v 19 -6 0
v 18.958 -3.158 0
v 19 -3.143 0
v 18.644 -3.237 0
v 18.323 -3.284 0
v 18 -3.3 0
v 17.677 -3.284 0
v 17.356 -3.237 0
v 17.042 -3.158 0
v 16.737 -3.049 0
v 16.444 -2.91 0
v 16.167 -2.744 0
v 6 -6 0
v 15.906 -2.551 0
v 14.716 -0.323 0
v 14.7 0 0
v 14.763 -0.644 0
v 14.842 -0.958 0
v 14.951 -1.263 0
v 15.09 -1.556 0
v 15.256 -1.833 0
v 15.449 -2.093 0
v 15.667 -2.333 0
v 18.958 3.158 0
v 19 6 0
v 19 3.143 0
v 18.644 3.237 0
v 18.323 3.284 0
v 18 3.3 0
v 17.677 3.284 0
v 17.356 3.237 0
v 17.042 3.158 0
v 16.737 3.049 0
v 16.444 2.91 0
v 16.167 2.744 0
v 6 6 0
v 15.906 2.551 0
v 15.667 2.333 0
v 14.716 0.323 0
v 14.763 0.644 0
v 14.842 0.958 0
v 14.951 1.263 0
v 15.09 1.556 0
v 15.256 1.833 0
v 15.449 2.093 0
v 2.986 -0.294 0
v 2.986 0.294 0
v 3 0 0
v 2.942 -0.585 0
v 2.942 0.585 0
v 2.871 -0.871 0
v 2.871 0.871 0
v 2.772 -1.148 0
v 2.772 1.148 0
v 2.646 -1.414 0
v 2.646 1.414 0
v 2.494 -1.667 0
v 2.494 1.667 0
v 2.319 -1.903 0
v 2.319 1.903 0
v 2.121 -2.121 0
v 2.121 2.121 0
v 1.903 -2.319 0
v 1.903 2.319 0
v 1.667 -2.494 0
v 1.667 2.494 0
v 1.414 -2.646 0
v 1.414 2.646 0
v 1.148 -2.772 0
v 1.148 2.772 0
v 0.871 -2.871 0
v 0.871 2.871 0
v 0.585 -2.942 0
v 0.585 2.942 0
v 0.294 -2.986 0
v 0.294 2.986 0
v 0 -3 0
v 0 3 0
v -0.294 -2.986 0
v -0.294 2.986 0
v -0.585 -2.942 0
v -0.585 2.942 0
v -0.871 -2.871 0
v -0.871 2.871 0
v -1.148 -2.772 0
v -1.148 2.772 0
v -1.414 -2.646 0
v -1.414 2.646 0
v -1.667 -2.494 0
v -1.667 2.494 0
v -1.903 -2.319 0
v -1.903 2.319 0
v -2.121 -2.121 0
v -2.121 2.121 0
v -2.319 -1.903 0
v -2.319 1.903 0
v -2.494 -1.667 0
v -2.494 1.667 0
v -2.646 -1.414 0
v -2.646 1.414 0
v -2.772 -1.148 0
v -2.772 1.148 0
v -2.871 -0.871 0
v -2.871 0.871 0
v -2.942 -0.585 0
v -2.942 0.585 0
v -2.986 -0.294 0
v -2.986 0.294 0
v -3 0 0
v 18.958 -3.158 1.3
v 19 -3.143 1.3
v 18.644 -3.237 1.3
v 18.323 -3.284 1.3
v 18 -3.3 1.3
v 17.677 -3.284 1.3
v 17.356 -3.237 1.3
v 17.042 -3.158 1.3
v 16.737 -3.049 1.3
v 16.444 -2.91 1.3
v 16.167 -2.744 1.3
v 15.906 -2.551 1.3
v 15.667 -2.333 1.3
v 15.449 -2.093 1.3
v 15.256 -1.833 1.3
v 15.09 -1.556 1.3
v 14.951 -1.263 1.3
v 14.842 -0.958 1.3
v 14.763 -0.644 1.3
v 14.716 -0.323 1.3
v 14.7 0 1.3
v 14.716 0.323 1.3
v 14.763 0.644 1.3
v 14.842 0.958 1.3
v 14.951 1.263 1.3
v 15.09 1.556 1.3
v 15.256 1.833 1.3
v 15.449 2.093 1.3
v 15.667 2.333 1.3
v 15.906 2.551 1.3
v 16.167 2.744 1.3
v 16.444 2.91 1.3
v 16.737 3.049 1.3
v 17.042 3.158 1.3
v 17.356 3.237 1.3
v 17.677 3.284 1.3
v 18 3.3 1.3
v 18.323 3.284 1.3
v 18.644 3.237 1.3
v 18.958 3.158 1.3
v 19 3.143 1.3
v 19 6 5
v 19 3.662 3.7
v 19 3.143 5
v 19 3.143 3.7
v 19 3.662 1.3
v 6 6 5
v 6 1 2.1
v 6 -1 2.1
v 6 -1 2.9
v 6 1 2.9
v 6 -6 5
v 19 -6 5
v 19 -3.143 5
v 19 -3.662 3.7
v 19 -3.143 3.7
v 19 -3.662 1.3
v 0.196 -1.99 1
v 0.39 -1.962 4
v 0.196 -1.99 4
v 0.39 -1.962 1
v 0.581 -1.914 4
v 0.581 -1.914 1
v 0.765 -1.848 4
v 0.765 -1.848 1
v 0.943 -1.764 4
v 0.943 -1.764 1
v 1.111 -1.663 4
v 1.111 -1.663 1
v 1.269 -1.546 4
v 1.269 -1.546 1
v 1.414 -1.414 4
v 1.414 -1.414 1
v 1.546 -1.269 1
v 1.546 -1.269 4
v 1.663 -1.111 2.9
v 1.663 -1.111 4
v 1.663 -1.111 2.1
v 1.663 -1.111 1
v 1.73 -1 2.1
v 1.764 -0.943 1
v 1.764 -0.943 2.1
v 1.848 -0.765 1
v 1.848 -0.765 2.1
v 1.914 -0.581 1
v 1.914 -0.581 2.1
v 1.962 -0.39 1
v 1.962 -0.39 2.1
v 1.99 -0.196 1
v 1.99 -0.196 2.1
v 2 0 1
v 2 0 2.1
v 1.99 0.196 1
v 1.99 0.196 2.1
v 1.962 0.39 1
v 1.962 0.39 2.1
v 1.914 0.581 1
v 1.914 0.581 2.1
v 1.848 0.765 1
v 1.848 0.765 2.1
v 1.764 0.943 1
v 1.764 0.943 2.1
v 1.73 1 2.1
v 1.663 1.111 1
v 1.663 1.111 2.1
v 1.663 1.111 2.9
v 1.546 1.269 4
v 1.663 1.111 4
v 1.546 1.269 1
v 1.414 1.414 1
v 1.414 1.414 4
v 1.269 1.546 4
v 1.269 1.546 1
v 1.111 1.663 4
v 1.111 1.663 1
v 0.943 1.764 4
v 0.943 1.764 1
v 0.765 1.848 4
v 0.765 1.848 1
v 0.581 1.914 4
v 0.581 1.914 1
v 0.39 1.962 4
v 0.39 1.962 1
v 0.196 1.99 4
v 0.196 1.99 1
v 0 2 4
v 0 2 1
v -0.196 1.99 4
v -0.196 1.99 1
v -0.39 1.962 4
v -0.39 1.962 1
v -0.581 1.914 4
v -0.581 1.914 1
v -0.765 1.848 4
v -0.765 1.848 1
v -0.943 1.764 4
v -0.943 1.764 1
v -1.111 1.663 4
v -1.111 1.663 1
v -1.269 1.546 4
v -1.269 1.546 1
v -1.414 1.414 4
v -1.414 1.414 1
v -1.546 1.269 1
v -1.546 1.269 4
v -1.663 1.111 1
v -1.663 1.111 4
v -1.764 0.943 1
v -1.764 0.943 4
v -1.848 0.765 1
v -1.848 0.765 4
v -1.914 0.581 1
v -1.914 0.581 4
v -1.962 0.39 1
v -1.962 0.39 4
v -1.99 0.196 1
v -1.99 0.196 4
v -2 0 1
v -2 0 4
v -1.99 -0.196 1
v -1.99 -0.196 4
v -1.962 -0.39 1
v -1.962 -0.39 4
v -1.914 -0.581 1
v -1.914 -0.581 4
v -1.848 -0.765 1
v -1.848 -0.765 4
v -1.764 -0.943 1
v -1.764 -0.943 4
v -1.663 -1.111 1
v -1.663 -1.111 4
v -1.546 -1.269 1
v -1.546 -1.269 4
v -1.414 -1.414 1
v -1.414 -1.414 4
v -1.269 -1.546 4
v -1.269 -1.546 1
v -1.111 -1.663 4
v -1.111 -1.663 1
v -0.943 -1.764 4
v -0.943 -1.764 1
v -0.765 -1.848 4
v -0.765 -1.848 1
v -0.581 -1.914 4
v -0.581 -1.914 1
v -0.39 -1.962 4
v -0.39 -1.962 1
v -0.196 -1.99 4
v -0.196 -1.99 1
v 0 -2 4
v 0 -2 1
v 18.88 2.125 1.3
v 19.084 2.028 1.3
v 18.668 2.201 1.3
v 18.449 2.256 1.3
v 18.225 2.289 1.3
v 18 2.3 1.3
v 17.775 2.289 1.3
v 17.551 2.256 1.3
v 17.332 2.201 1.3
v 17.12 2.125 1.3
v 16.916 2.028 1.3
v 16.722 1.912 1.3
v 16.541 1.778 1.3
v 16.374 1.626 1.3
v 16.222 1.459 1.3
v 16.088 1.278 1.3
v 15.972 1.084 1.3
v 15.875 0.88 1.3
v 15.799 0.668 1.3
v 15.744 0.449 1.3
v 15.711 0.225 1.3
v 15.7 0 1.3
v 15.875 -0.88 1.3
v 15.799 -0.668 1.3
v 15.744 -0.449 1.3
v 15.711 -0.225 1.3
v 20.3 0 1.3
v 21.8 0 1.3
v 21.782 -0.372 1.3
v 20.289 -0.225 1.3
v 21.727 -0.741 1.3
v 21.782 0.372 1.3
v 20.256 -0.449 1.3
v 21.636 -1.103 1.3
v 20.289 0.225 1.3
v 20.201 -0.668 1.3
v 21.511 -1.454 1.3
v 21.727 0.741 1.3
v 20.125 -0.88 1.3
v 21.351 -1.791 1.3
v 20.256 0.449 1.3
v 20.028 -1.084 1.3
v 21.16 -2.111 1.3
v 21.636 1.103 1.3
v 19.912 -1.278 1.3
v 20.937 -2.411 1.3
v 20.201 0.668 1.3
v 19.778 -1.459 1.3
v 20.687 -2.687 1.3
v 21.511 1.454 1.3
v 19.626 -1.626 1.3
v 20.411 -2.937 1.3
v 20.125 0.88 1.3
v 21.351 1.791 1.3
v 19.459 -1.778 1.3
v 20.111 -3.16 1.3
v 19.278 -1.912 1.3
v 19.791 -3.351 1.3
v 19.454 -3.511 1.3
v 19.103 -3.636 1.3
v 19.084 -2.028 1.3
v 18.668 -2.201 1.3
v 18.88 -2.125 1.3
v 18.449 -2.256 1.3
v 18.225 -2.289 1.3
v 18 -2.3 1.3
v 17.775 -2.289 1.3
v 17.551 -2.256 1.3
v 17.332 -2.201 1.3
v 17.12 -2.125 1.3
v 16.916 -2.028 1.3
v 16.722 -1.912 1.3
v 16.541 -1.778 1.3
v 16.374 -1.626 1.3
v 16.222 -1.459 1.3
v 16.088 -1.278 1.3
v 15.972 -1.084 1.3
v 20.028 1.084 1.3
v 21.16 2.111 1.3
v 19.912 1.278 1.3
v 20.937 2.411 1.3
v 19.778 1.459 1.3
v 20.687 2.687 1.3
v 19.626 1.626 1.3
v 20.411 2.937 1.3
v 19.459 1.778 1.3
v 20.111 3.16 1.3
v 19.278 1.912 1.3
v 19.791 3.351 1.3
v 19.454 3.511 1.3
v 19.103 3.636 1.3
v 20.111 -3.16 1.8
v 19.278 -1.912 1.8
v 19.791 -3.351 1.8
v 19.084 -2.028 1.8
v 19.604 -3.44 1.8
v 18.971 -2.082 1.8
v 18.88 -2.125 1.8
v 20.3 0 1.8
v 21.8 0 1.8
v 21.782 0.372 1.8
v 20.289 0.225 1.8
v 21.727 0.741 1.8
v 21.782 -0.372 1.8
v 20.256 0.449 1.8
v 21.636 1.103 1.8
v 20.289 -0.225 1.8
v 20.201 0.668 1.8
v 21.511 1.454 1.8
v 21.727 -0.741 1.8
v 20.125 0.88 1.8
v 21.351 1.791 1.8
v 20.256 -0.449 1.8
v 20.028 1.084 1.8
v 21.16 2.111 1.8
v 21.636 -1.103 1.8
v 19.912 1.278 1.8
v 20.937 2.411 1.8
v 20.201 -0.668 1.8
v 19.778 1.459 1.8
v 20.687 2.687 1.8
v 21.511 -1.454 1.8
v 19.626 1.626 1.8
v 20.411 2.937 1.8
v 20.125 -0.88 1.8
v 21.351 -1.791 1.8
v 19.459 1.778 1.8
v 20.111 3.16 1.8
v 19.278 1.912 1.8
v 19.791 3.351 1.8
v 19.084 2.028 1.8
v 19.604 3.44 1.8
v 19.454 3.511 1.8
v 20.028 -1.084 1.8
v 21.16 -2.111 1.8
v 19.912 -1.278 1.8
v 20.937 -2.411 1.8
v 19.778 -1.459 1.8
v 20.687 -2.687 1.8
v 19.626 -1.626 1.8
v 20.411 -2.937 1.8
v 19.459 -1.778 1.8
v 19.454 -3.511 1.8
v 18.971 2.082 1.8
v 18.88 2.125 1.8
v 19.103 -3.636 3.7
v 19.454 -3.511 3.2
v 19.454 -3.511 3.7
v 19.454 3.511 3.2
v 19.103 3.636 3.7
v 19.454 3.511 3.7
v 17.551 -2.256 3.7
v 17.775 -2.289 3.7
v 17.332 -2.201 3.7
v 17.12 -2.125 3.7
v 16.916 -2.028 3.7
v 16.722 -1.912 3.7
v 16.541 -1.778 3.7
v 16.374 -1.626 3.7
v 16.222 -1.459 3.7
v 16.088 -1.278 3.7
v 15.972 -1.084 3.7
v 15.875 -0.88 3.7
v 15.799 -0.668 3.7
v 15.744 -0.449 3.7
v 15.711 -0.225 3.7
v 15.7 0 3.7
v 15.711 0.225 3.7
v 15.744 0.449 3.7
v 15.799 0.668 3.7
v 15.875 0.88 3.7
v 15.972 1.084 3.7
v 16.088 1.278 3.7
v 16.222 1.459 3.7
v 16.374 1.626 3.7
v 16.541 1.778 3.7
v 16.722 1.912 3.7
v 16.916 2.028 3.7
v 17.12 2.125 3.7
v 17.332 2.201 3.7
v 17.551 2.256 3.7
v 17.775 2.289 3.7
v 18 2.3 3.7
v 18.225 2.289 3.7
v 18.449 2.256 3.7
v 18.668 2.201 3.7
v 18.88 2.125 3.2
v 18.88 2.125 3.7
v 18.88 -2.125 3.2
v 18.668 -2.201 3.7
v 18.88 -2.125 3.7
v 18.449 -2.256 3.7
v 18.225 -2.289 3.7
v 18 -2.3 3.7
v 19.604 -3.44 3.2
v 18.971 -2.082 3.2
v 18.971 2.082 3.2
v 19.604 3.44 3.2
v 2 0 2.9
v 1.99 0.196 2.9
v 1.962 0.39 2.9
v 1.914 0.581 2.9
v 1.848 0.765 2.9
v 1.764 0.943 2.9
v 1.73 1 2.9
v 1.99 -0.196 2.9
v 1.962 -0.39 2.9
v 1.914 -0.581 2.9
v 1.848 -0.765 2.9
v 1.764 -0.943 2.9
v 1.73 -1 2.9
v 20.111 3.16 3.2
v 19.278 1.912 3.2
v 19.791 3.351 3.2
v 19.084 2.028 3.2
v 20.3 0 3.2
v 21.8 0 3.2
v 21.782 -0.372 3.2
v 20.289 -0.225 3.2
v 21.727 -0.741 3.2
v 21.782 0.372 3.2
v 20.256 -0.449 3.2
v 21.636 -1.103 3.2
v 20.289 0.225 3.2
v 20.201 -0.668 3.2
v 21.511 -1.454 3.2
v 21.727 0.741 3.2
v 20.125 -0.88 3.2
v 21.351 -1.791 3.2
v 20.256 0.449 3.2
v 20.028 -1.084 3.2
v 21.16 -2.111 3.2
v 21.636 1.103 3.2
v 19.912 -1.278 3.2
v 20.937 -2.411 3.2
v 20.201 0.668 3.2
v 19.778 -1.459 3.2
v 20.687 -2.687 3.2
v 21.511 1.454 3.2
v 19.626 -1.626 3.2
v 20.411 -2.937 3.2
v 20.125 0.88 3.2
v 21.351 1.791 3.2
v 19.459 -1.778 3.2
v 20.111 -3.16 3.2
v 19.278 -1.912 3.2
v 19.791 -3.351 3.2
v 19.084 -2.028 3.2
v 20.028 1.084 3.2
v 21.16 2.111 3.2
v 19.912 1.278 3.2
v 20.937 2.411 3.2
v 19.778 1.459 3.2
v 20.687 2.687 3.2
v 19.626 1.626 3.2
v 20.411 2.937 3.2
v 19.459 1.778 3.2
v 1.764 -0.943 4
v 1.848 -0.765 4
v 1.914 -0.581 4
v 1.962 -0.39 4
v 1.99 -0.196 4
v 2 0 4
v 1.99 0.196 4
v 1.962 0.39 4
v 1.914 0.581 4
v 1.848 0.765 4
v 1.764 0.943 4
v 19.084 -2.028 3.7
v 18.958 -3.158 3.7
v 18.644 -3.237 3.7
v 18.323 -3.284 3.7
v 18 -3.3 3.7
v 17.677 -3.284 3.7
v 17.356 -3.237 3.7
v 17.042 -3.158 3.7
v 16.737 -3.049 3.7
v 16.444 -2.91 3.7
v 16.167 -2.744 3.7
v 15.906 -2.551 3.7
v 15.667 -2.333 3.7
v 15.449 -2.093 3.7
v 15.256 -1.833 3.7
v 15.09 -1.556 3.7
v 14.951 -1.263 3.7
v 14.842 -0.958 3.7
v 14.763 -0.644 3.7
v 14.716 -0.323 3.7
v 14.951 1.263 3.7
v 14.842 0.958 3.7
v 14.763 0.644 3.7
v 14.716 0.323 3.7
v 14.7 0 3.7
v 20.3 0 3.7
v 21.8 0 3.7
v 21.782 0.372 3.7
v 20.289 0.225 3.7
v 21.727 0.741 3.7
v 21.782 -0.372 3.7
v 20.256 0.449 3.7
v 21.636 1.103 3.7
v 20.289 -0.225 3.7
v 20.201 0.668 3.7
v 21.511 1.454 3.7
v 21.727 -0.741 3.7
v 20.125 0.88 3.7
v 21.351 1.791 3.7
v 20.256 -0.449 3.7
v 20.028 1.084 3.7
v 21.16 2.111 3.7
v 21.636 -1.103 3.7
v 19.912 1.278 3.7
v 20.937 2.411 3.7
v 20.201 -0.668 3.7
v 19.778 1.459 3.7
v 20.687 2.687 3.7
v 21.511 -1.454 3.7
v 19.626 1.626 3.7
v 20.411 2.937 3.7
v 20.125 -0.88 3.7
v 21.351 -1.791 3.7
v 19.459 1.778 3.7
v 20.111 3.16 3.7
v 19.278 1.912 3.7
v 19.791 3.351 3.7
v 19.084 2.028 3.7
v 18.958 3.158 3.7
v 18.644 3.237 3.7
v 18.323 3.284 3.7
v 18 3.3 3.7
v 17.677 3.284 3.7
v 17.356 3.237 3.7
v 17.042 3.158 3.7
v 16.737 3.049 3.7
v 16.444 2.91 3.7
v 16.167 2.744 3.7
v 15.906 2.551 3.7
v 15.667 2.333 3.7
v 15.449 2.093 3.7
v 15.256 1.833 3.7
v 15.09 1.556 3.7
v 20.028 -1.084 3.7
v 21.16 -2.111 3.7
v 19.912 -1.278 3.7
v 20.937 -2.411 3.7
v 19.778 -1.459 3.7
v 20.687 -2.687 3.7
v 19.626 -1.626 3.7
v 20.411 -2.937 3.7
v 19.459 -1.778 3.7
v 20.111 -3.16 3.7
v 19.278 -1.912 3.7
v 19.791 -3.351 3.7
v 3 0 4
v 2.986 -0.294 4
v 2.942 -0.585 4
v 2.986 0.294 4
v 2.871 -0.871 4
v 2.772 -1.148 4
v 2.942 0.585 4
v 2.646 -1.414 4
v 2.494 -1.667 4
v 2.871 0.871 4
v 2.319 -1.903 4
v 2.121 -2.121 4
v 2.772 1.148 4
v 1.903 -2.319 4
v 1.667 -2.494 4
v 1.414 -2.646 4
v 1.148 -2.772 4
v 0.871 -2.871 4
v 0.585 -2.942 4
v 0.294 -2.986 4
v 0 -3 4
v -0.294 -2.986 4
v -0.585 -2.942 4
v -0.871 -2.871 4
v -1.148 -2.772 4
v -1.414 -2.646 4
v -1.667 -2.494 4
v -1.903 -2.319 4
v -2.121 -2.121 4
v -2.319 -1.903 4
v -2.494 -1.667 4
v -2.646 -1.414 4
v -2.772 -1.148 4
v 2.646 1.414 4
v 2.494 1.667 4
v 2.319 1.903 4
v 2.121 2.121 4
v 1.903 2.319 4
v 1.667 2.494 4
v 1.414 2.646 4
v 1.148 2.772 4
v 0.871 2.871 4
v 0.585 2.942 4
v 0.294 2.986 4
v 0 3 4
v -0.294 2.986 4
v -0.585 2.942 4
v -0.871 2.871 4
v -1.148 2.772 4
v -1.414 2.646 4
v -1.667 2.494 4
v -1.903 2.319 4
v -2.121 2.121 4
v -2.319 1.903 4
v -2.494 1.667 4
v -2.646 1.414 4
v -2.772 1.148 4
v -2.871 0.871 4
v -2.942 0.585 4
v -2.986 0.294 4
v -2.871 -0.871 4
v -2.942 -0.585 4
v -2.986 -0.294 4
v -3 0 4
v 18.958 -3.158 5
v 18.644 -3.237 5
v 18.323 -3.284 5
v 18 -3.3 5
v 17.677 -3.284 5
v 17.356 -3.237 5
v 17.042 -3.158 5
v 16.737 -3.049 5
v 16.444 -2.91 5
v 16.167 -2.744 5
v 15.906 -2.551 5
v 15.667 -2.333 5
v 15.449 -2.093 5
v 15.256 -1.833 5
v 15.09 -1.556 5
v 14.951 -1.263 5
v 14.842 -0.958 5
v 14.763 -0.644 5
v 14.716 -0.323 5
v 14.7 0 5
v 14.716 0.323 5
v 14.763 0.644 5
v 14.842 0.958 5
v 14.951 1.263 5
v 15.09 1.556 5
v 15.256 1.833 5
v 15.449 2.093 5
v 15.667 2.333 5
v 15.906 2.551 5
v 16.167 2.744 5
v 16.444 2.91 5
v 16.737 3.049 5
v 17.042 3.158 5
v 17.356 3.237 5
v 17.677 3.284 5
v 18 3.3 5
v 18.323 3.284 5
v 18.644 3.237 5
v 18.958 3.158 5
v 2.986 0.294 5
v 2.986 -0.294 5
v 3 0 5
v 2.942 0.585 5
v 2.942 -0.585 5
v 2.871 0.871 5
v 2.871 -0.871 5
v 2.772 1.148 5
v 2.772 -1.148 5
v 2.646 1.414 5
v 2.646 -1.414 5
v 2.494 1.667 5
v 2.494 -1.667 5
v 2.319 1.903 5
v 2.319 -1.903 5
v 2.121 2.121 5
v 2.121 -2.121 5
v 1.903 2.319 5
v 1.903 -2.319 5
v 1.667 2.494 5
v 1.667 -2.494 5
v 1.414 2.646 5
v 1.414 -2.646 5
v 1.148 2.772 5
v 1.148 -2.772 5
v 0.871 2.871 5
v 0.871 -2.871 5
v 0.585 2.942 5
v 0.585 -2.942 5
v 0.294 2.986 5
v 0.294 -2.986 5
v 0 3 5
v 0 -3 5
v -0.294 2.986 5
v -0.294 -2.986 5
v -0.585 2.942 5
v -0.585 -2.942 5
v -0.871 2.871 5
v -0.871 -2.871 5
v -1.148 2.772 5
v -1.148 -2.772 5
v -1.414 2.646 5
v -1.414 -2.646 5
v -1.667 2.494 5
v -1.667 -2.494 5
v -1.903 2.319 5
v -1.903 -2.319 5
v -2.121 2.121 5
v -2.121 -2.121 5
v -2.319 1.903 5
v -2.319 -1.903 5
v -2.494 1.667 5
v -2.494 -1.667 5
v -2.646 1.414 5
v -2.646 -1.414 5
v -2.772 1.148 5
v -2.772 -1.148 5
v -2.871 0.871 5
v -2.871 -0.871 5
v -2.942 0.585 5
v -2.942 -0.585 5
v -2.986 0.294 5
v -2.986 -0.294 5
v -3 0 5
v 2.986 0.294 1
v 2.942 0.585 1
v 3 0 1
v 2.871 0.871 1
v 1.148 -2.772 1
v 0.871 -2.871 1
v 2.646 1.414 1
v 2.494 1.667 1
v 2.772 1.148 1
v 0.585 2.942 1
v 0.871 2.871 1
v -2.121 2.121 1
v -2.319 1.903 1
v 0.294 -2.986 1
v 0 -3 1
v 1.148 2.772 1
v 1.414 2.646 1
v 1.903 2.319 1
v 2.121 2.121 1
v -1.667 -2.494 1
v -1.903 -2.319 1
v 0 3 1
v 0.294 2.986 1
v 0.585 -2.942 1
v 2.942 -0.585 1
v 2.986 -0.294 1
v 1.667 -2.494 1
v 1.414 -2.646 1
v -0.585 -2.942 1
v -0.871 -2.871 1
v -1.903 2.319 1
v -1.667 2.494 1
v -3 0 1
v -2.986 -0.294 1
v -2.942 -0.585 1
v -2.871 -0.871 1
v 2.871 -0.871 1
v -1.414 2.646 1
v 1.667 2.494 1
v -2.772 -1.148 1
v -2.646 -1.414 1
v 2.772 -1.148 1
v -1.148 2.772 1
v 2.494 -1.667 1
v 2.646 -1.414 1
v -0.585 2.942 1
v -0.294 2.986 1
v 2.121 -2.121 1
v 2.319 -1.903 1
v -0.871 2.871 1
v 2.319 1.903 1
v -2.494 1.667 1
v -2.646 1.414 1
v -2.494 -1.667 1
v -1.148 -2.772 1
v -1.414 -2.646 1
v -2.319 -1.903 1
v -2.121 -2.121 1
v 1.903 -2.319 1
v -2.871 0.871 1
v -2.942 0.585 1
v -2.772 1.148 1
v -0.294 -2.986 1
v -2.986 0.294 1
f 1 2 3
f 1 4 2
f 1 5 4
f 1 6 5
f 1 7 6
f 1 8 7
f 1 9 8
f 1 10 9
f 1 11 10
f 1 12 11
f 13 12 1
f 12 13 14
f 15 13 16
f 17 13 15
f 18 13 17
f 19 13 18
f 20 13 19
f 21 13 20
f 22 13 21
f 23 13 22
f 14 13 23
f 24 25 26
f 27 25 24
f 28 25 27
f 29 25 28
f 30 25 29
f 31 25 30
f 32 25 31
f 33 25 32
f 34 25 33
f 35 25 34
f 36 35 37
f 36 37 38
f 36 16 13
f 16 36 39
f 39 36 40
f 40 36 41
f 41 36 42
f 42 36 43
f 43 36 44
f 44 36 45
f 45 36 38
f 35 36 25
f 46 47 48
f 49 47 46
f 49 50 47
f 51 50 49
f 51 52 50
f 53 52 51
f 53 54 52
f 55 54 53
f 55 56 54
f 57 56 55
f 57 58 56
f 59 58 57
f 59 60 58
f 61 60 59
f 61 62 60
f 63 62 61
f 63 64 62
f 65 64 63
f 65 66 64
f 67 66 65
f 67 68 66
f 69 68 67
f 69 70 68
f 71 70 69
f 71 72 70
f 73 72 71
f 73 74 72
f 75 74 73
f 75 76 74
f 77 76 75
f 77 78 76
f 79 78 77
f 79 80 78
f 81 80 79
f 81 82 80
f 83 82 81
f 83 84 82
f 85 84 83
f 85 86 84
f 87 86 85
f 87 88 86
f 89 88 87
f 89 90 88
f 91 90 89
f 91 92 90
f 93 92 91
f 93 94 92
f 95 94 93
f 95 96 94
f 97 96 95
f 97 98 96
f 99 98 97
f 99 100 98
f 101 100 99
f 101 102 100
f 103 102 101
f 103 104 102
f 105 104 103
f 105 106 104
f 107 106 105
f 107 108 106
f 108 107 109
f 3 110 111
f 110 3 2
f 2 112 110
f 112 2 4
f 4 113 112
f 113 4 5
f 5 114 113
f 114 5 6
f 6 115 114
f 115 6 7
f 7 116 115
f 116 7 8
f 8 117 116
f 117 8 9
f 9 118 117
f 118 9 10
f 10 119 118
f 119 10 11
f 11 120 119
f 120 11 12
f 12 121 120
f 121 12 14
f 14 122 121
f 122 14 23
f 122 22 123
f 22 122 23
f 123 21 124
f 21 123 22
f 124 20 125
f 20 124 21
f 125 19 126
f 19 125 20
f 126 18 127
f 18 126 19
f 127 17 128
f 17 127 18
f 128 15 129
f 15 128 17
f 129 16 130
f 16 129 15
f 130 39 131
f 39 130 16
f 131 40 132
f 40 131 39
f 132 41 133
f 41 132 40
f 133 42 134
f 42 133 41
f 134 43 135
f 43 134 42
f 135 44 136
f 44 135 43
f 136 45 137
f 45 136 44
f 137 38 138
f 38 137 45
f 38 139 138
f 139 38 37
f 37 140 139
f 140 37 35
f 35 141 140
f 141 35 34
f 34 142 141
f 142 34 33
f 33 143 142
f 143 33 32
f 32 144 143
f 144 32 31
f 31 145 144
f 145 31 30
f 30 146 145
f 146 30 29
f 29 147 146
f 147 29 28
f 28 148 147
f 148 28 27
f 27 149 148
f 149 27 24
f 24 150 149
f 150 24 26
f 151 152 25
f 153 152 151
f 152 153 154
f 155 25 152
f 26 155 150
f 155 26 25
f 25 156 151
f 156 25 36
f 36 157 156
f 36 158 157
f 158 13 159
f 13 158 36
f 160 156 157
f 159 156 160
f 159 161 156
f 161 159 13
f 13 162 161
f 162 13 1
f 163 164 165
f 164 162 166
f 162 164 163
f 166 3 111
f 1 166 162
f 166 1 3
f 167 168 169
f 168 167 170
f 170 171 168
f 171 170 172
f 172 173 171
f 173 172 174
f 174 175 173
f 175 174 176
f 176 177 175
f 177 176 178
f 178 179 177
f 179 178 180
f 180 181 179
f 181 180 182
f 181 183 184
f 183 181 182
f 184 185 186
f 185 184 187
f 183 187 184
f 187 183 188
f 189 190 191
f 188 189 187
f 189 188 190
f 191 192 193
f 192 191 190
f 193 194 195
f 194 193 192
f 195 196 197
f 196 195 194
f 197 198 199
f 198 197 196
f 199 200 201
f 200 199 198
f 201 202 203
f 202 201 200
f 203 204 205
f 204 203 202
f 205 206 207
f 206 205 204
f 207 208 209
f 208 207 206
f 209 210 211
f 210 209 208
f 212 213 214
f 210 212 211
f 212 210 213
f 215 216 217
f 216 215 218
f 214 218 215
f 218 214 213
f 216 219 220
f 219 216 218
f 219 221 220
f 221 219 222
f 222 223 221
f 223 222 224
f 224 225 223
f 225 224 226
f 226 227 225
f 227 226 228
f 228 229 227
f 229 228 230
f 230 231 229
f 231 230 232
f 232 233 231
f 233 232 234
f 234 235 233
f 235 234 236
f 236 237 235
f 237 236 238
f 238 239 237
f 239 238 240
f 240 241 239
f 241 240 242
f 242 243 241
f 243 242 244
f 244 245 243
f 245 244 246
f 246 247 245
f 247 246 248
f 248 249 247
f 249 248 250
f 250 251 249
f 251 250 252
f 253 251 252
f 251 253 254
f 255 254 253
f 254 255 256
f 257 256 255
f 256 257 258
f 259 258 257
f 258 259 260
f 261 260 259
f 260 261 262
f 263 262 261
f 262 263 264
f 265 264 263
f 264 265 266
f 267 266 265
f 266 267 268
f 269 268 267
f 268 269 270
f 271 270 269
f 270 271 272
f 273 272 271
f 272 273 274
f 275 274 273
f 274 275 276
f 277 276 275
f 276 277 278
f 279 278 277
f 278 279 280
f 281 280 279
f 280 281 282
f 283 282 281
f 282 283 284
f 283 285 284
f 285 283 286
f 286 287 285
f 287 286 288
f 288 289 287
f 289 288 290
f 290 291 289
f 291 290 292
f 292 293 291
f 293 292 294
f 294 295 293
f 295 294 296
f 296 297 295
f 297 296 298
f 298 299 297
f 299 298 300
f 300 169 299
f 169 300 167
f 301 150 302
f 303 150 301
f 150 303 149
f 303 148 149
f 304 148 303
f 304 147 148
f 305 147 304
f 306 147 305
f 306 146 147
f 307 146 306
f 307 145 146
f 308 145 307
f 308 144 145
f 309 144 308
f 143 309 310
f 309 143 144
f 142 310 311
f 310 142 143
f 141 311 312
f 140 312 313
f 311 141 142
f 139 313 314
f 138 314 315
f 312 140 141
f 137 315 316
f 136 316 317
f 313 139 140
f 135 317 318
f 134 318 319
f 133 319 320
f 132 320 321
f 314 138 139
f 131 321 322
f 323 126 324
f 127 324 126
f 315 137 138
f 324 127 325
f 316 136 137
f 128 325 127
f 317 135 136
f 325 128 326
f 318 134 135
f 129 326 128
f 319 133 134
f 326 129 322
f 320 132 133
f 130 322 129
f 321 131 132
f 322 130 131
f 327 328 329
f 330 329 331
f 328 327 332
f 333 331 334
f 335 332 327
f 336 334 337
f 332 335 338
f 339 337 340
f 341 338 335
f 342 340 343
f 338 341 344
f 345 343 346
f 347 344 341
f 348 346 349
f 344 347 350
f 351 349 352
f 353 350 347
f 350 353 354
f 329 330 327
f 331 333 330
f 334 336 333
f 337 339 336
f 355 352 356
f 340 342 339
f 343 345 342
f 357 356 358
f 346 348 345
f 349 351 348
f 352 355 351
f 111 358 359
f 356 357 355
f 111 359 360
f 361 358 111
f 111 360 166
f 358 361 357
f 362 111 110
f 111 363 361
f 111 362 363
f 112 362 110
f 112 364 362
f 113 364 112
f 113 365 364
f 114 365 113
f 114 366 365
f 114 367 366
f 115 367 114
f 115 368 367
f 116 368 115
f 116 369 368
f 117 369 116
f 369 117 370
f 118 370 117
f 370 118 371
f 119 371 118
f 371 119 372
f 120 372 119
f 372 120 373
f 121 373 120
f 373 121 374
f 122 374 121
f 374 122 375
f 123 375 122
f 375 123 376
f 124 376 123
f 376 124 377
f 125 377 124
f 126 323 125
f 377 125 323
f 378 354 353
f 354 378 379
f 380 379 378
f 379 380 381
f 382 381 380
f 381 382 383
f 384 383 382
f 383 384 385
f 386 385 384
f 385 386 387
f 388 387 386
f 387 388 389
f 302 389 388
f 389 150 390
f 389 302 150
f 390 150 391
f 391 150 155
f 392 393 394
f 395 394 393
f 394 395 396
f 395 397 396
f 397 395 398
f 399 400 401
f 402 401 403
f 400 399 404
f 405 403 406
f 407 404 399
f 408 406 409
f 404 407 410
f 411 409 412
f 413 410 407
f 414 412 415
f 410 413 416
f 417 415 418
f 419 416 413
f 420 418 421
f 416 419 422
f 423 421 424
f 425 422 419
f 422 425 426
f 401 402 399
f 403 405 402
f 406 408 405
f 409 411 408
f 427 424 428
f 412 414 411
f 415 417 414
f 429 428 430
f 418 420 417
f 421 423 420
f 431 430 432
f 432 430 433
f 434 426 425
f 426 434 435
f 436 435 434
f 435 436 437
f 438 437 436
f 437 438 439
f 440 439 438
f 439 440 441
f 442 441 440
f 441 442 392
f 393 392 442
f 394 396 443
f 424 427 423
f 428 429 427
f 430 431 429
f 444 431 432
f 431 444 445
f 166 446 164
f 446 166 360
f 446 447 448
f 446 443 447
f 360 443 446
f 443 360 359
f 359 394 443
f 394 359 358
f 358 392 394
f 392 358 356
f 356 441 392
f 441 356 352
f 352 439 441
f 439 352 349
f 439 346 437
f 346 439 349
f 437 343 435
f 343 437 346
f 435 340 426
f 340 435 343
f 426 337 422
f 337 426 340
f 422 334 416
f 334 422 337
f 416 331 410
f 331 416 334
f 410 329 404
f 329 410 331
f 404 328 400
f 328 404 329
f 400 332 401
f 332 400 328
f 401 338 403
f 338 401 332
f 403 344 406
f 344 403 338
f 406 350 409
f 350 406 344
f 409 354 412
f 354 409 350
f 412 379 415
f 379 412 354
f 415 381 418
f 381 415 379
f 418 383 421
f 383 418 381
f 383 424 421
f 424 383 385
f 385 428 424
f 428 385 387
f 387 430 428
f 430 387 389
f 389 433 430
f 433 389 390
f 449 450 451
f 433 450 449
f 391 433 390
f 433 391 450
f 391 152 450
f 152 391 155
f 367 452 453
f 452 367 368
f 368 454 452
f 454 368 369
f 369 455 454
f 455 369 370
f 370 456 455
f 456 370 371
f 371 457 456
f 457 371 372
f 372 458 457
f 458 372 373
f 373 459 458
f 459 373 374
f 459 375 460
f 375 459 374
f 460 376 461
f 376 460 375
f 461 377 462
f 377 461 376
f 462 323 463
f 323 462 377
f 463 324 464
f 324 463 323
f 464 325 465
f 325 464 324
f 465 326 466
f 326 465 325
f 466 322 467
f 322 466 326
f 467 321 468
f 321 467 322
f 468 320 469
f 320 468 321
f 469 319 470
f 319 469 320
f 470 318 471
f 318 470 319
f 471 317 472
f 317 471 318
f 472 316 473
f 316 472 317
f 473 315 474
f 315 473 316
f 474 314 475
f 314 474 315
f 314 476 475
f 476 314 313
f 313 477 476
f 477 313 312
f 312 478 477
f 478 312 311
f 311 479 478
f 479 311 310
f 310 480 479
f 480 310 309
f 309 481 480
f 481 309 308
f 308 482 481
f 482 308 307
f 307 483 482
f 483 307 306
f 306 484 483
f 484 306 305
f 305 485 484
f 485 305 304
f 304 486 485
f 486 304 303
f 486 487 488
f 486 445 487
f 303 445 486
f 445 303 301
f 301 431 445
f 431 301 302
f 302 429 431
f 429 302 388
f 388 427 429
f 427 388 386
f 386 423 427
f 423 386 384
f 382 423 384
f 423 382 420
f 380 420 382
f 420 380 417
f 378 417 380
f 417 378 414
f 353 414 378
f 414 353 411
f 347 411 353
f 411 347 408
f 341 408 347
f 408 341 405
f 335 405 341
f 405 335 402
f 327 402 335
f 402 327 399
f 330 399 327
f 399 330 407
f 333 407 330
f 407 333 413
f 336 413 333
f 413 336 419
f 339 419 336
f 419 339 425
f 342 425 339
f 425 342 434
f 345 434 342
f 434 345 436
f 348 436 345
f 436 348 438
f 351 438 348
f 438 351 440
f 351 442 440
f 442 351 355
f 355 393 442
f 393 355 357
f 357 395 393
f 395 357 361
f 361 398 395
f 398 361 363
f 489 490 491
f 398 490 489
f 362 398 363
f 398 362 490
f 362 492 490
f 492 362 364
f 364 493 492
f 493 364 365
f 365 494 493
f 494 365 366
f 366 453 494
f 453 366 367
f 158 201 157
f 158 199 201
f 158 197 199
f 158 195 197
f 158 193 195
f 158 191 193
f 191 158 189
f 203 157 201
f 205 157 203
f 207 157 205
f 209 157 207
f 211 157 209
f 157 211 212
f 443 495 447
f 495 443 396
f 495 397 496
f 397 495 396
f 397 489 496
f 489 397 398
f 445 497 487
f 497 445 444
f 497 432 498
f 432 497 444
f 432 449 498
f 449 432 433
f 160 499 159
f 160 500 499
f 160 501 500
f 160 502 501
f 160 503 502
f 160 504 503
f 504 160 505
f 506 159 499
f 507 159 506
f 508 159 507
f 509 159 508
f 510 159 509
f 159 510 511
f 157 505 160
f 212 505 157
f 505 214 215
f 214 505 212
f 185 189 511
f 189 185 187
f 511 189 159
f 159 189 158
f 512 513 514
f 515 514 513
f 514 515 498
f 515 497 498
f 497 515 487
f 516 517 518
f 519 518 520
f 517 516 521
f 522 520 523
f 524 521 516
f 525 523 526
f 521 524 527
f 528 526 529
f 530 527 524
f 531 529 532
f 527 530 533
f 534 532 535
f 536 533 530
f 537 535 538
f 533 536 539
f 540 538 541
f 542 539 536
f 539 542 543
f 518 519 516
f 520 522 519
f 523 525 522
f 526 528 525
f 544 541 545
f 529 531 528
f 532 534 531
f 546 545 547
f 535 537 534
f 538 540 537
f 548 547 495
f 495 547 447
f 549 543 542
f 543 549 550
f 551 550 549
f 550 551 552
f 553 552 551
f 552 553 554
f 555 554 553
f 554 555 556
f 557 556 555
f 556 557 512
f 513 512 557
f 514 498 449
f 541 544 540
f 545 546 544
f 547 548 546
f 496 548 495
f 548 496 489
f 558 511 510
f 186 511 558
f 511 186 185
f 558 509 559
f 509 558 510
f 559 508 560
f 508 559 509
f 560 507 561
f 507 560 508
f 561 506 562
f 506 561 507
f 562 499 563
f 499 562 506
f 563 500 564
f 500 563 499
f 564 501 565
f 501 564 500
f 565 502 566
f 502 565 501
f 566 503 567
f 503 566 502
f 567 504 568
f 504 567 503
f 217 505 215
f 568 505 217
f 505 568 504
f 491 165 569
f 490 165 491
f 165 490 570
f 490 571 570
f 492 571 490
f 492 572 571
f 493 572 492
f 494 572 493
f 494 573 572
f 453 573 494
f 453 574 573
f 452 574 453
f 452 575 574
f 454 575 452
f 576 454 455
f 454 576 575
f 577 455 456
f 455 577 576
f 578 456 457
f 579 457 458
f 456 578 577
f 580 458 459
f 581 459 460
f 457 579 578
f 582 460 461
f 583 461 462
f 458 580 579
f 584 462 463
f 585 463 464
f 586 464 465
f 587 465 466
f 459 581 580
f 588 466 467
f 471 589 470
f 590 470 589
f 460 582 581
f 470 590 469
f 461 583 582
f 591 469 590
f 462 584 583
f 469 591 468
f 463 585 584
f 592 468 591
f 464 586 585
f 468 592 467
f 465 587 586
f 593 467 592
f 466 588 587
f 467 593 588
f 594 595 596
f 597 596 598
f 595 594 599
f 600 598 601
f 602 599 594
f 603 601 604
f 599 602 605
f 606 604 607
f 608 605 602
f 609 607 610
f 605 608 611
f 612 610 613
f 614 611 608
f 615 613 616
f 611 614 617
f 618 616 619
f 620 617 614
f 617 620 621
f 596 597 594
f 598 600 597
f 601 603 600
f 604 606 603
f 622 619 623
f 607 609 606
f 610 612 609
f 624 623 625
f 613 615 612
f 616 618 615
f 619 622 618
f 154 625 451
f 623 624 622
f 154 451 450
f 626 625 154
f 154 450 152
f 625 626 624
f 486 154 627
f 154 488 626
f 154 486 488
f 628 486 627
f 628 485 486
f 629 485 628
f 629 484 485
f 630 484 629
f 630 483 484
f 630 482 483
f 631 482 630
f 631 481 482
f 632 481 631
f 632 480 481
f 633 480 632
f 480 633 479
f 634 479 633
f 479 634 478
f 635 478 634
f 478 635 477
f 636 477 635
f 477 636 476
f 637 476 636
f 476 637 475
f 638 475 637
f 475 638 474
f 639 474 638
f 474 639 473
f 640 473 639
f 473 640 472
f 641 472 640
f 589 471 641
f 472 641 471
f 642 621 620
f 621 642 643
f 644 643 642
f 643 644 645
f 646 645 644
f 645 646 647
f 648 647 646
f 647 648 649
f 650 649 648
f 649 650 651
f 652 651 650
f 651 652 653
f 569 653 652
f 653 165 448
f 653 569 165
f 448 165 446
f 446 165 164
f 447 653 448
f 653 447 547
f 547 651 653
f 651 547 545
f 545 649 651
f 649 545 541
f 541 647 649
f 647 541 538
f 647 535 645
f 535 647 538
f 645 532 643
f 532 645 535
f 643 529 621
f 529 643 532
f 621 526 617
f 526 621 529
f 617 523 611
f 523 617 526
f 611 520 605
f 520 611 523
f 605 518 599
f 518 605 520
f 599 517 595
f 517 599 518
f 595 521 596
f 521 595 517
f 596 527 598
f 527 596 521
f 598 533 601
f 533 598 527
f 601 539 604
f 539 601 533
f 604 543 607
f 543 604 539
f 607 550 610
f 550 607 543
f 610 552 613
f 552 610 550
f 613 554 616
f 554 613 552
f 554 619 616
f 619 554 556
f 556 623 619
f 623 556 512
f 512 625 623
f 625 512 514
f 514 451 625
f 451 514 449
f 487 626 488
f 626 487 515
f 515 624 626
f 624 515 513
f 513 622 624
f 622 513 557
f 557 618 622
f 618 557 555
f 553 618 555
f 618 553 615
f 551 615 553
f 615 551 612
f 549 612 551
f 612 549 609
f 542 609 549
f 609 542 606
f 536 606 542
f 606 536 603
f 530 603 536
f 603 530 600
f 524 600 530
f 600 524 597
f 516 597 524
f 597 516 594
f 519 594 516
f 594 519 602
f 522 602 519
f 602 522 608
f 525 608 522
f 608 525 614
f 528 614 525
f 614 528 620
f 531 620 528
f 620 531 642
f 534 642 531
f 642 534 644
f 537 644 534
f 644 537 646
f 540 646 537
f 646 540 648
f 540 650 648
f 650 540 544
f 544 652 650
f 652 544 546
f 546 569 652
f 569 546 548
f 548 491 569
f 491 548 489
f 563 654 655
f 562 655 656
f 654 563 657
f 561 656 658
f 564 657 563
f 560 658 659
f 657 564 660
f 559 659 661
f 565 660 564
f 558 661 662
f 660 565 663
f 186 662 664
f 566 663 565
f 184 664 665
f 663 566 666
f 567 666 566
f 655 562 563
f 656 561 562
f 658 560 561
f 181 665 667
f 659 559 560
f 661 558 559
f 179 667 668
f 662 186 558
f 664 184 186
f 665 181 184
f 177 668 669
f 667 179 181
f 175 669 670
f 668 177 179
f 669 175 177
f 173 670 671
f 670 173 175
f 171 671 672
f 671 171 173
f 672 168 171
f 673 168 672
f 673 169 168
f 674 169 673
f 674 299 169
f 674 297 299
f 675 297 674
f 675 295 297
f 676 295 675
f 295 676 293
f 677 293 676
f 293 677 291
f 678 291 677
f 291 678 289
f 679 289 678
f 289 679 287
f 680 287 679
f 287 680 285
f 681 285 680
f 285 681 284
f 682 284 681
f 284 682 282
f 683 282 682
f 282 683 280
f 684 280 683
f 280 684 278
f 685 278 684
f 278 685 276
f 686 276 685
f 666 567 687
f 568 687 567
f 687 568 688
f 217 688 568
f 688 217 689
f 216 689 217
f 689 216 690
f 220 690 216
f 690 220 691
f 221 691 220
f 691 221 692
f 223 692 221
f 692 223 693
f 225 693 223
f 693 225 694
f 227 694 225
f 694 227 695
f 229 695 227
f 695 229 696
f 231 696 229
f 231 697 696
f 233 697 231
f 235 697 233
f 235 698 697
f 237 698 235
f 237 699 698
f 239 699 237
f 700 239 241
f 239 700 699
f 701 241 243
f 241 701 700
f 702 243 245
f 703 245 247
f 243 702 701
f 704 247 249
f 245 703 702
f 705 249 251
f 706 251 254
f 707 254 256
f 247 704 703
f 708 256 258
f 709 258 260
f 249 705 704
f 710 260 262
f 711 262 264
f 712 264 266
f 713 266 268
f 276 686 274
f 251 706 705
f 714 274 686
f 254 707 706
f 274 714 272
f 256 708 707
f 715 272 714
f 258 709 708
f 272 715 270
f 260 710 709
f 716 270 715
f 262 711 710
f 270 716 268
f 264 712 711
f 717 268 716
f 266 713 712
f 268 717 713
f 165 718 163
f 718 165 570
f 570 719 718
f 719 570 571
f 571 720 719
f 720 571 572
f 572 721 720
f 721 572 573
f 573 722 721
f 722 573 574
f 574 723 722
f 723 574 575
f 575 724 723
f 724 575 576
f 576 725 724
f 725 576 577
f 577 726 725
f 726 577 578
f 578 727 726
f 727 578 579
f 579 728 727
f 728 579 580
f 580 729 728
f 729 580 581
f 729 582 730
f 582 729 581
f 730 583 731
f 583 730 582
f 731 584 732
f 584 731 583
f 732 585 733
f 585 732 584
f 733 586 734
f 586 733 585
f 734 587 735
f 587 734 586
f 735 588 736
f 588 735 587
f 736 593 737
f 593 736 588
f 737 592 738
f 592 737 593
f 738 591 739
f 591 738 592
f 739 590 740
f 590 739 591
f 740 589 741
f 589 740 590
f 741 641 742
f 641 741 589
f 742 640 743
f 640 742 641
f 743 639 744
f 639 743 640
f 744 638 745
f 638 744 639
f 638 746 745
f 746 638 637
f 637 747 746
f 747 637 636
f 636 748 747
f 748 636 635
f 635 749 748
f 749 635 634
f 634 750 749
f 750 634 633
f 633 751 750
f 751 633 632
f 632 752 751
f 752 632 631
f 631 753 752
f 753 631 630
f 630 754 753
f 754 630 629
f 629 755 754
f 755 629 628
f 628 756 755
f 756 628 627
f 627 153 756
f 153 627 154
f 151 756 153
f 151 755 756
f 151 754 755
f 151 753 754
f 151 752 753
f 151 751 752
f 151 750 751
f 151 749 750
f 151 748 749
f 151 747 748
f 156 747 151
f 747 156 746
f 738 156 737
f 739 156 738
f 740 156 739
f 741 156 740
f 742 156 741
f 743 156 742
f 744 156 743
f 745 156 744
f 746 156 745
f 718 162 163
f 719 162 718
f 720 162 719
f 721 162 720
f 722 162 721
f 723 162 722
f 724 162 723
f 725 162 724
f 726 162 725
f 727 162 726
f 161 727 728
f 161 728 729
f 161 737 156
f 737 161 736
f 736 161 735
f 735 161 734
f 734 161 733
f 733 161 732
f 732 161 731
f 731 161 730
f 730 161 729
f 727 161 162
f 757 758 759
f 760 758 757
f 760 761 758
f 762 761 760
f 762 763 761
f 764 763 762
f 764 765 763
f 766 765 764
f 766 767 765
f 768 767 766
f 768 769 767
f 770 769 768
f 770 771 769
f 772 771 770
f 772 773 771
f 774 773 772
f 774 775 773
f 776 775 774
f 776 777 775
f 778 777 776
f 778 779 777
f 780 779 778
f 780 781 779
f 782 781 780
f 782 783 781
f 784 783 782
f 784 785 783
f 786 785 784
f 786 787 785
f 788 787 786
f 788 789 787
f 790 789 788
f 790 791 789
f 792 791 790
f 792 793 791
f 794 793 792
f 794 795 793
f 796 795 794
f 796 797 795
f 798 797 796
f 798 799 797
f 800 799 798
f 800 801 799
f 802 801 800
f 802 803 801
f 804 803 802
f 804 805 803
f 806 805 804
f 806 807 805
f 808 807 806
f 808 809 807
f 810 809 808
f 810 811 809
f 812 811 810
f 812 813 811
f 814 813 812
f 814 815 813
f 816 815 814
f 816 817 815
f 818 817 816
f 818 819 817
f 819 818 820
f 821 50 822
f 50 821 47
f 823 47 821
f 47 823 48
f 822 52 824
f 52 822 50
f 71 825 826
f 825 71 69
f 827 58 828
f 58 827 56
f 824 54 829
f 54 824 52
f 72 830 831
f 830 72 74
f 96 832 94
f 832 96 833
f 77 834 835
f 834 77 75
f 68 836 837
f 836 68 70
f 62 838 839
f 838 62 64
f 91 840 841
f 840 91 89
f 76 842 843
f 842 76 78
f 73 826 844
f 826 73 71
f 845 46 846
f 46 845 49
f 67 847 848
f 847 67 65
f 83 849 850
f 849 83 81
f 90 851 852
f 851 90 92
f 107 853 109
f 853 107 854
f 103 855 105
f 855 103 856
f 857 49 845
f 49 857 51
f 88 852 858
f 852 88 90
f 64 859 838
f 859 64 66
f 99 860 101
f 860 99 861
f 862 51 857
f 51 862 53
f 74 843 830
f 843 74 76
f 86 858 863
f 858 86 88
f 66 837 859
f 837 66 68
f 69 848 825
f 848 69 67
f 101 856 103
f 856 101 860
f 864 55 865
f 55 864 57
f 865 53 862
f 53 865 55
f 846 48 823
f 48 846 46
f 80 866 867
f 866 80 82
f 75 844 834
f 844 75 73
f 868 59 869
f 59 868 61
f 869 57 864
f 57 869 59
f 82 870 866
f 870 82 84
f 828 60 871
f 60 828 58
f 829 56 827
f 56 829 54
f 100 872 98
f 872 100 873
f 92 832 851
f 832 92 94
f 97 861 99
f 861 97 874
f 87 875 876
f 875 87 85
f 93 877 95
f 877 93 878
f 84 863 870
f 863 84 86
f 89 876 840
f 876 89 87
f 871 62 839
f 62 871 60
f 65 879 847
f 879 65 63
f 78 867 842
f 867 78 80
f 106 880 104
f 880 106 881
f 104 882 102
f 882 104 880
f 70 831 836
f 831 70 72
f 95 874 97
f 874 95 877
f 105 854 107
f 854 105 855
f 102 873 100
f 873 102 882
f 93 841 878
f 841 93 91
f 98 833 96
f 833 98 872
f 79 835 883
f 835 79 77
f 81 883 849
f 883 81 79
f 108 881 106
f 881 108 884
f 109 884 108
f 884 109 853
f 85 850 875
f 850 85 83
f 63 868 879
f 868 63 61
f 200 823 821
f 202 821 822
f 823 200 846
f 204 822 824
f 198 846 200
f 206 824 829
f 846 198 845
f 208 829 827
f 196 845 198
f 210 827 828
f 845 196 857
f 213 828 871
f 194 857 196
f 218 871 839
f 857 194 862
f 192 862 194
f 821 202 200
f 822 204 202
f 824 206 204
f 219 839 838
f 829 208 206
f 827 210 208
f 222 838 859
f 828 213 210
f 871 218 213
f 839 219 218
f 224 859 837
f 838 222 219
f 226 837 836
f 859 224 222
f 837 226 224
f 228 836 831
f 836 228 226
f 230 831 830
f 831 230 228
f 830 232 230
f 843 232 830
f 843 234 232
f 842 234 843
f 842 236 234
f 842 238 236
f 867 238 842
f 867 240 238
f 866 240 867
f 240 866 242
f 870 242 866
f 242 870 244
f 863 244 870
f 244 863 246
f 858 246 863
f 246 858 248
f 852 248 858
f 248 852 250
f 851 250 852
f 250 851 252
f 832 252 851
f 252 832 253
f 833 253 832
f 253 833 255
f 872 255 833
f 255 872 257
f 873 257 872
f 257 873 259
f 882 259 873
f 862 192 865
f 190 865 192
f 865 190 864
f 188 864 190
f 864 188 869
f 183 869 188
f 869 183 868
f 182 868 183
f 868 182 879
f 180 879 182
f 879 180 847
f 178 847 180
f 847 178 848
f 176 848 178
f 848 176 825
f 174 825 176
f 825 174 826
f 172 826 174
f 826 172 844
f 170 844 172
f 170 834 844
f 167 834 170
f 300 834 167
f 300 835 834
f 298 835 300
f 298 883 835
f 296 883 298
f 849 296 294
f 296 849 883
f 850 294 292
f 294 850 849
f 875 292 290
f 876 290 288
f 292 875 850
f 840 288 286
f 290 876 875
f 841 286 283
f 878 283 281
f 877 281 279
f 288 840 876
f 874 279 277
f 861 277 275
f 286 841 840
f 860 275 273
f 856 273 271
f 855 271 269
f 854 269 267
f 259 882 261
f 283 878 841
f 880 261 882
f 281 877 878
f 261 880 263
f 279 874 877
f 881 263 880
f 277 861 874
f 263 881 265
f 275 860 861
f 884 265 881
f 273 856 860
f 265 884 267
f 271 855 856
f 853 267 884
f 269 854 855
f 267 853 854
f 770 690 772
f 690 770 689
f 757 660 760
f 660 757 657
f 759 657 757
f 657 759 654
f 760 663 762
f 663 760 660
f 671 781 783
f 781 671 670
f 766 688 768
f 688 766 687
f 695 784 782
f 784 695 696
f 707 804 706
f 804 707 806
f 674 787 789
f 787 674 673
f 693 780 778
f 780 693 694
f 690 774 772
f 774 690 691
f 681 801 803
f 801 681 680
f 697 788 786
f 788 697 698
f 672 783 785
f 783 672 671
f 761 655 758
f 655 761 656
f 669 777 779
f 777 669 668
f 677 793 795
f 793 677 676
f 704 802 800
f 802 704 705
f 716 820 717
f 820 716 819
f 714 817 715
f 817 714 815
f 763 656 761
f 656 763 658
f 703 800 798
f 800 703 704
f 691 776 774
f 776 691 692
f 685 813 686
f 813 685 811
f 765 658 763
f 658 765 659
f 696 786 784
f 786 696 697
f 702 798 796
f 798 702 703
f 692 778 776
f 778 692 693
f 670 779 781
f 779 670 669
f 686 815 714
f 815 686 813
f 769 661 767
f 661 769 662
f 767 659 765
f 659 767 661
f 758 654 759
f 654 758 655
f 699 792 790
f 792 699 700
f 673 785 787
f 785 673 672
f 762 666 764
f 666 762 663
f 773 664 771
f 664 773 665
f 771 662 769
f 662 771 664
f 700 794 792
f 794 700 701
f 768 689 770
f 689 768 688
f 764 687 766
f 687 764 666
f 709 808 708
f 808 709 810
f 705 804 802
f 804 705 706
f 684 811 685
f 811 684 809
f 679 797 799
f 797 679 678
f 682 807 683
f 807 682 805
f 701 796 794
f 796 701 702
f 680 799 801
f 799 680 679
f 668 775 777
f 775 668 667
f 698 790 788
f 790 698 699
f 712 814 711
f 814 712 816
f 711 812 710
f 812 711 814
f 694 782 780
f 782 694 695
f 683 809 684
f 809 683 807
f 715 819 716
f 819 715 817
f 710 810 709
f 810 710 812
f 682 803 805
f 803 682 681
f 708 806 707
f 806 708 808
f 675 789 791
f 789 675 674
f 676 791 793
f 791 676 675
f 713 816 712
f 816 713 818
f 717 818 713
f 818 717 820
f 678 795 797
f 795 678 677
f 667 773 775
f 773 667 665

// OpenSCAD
part = "link"; // [link, assembly]
cadverify_only = "";
module instance(name, part, unit = 1) {
    echo(cadverify_instance = [name, part, unit]);
    if (cadverify_only == "" || cadverify_only == name) children();
}

// Parameters (mm)
pitch = 18;          // pin-to-bore distance (10 links = 180mm)
link_w = 12;         // width (Y)
link_t = 5;          // thickness (Z)
pin_d = 4;           // pin shaft diameter
bore_d = 4.6;        // bore diameter (0.3 radial clearance)
cap_d = 6;           // cap diameter
cap_h = 1;           // cap thickness
kn_out_d = 7.6;      // knuckle outer diameter (1.5 wall)
cap_cav_d = 6.6;     // cap clearance diameter (0.3 radial)
neck_w = 2;          // neck width
neck_t = 0.8;        // neck thickness (central only)
slot_half = 65;      // slot half-angle (deg), allows +-30 deg swing
yoke_west = 6;       // yoke west edge (local X)
yoke_east = 19;      // yoke east extent (local X)
$fn = 64;

module link_geom() {
    bore_x = pitch;
    pin_r = pin_d/2;
    bore_r = bore_d/2;
    kn_out_r = kn_out_d/2;
    cav_r = cap_cav_d/2;
    cap_r = cap_d/2;
    wedge_far = 30;
    dy_far = wedge_far * tan(slot_half);
    // Z stack
    z0=0; z1=cap_h;              // 0..1 bottom
    z2=z1+0.3;                   // 1..1.3 lower cap clearance
    z3=z2+0.5;                   // 1.3..1.8 lower lip (closed)
    z4=z3+0.3;                   // 1.8..2.1 lower neck gap (slotted)
    z5=z4+neck_t;                // 2.1..2.9 central (slotted, neck lives)
    z6=z5+0.3;                   // 2.9..3.2 upper neck gap (slotted)
    z7=z6+0.5;                   // 3.2..3.7 upper lip (closed)
    z8=z7+0.3;                   // 3.7..4.0 upper cap clearance
    z9=z8+cap_h;                 // 4..5 top
    // 2D helpers (modules can't take shapes, so inline each layer)
    // bottom (0..1)
    translate([0,0,z0]) linear_extrude(height=z1-z0, convexity=8) {
        difference() {
            union() {
                circle(r=pin_r);
                translate([yoke_west,-link_w/2]) square([yoke_east-yoke_west, link_w]);
            }
            translate([bore_x,0]) circle(r=cav_r);
        }
    }
    // lower cap clearance (1..1.3)
    translate([0,0,z1]) linear_extrude(height=z2-z1, convexity=8) {
        difference() {
            union() {
                circle(r=pin_r);
                translate([yoke_west,-link_w/2]) square([yoke_east-yoke_west, link_w]);
            }
            translate([bore_x,0]) circle(r=cav_r);
        }
    }
    // lower lip (1.3..1.8) closed bore
    translate([0,0,z2]) linear_extrude(height=z3-z2, convexity=8) {
        difference() {
            union() {
                circle(r=pin_r);
                translate([yoke_west,-link_w/2]) square([yoke_east-yoke_west, link_w]);
                translate([bore_x,0]) circle(r=kn_out_r);
            }
            translate([bore_x,0]) circle(r=bore_r);
        }
    }
    // lower neck gap (1.8..2.1) slotted
    translate([0,0,z3]) linear_extrude(height=z4-z3, convexity=8) {
        difference() {
            union() {
                circle(r=pin_r);
                translate([yoke_west,-link_w/2]) square([yoke_east-yoke_west, link_w]);
                translate([bore_x,0]) circle(r=kn_out_r);
            }
            translate([bore_x,0]) circle(r=bore_r);
            polygon(points=[[bore_x,0],[bore_x+wedge_far,dy_far],[bore_x+wedge_far,-dy_far]]);
        }
    }
    // central (2.1..2.9) slotted + neck
    translate([0,0,z4]) linear_extrude(height=z5-z4, convexity=8) {
        difference() {
            union() {
                circle(r=pin_r);
                translate([0,-neck_w/2]) square([yoke_west+1, neck_w]);
                translate([yoke_west,-link_w/2]) square([yoke_east-yoke_west, link_w]);
                translate([bore_x,0]) circle(r=kn_out_r);
            }
            translate([bore_x,0]) circle(r=bore_r);
            polygon(points=[[bore_x,0],[bore_x+wedge_far,dy_far],[bore_x+wedge_far,-dy_far]]);
        }
    }
    // upper neck gap (2.9..3.2) slotted
    translate([0,0,z5]) linear_extrude(height=z6-z5, convexity=8) {
        difference() {
            union() {
                circle(r=pin_r);
                translate([yoke_west,-link_w/2]) square([yoke_east-yoke_west, link_w]);
                translate([bore_x,0]) circle(r=kn_out_r);
            }
            translate([bore_x,0]) circle(r=bore_r);
            polygon(points=[[bore_x,0],[bore_x+wedge_far,dy_far],[bore_x+wedge_far,-dy_far]]);
        }
    }
    // upper lip (3.2..3.7) closed
    translate([0,0,z6]) linear_extrude(height=z7-z6, convexity=8) {
        difference() {
            union() {
                circle(r=pin_r);
                translate([yoke_west,-link_w/2]) square([yoke_east-yoke_west, link_w]);
                translate([bore_x,0]) circle(r=kn_out_r);
            }
            translate([bore_x,0]) circle(r=bore_r);
        }
    }
    // upper cap clearance (3.7..4)
    translate([0,0,z7]) linear_extrude(height=z8-z7, convexity=8) {
        difference() {
            union() {
                circle(r=pin_r);
                translate([yoke_west,-link_w/2]) square([yoke_east-yoke_west, link_w]);
            }
            translate([bore_x,0]) circle(r=cav_r);
        }
    }
    // top (4..5)
    translate([0,0,z8]) linear_extrude(height=z9-z8, convexity=8) {
        difference() {
            union() {
                circle(r=pin_r);
                translate([yoke_west,-link_w/2]) square([yoke_east-yoke_west, link_w]);
            }
            translate([bore_x,0]) circle(r=cav_r);
        }
    }
    // caps (pin ends)
    translate([0,0,0]) cylinder(h=cap_h, r=cap_r);
    translate([0,0,link_t-cap_h]) cylinder(h=cap_h, r=cap_r);
}

if (part == "assembly") {
    instance("link1", "link", 1) translate([0,0,0]) link_geom();
    instance("link2", "link", 1) translate([18,0,0]) link_geom();
    instance("link3", "link", 1) translate([36,0,0]) link_geom();
    echo(cadverify_spec = [
        ["bounds", [[-3, -6, 0], [55.7, 6, 5]]],
        ["support_faces", [["bed", "-z", 200]]],
        ["motions", [
            ["bend", ["link3"], "rotate", [36, 0, 0], [0, 0, 1], [-30, 30]]
        ]],
        ["assembly_order", [
            [["link1", "link2", "link3"], [0, 0, 0]]
        ]],
        ["print_in_place", 0.3],
        ["overhangs_allowed", [
            ["pin cap link1", [[-3, -3, 3.8], [3, 3, 4.2]]],
            ["knuckle joint1", [[14, -4, 1.0], [22, 4, 1.6]]],
            ["pin cap link2", [[15, -3, 3.8], [21, 3, 4.2]]],
            ["knuckle joint2", [[32, -4, 1.0], [40, 4, 1.6]]],
            ["pin cap link3", [[33, -3, 3.8], [39, 3, 4.2]]],
            ["knuckle end", [[50, -4, 1.0], [58, 4, 1.6]]]
        ]],
        ["held", ["link1", "link2", "link3"]]
    ]);
} else {
    link_geom();
    echo(cadverify_spec = [
        ["bounds", [[-3, -6, 0], [21.9, 6, 5]]],
        ["bodies", 1],
        ["through_holes", 2],
        ["support_faces", [["bed", "-z", 100]]],
        ["overhangs_allowed", [
            ["pin cap", [[-3, -3, 3.8], [3, 3, 4.2]]],
            ["knuckle ceiling", [[14, -4, 1.0], [22, 4, 1.6]]]
        ]],
        ["copies", 3],
        ["details", [
            ["body", "material", [[6, -6, 0], [14, 6, 5]], 0.85],
            ["neck", "material", [[0, -1, 2.1], [7, 1, 2.9]], 0.8],
            ["knuckle", "material", [[14.2, -3.8, 1.3], [21.8, 3.8, 3.7]], 0.25],
            ["slot", "void", [[19, -1, 2.1], [21, 1, 2.9]], 0.8],
            ["cap_cavity", "void", [[14.7, -3.3, 0], [21.3, 3.3, 1]], 0.5],
            ["wall", "thickness", [18, 7, 2.5], [0, -1, 0], 3.7],
            ["floor", "thickness", [9, 0, -1], [0, 0, 1], 5]
        ]]
    ]);
}
